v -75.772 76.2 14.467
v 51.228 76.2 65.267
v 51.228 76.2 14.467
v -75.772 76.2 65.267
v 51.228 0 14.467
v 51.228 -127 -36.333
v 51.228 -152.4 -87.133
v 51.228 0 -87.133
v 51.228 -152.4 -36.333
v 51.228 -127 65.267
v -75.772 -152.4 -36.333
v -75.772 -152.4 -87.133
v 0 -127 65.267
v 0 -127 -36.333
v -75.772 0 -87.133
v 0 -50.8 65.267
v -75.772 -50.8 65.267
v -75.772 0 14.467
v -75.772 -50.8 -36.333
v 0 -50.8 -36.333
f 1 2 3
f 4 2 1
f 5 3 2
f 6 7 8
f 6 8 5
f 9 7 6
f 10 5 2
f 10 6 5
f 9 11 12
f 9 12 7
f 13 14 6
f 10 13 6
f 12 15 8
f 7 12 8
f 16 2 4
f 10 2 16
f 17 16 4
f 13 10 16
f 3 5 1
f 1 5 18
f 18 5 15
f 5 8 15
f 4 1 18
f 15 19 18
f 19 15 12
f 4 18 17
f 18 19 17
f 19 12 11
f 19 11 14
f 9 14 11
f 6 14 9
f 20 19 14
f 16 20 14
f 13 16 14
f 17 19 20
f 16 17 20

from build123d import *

# Parameters (mm, degrees)
F0_W     = 127
F0_H     = 50.8
F1_DEPTH = 152.4
F2_W     = 76.2
F2_H     = 50.8
F3_DEPTH = 101.6
F5_DEPTH = 101.6
F6_W     = 127
F6_H     = 50.8
F7_DEPTH = 76.2


with BuildPart() as f1:
    # F0 (on Front) → F1 (new body)
    with BuildSketch(Plane.XZ):
        with Locations((-12.272136, -61.733169)):
            Rectangle(F0_W, F0_H)
    extrude(amount=F1_DEPTH)

    # F2 (on face) → F3 (join)
    with BuildSketch(Plane.XY.offset(-36.333169)):
        with Locations((-37.672136, -25.4)):
            Rectangle(F2_W, F2_H)
    extrude(amount=F3_DEPTH)

    # F4 (on face) → F5 (join)
    with BuildSketch(Plane.XY.offset(-36.333169)):
        Polygon((51.227864, -127), (51.227864, 0), (0.427864, 0), (0.427864, -50.8), (0, -50.8), (0, -127), align=None)
    extrude(amount=F5_DEPTH)

    # F6 (on face) → F7 (join)
    with BuildSketch(Plane(origin=(0, 0, 0), x_dir=(-1, 0, 0), z_dir=(0, 1, 0))):
        with Locations((12.272136, 39.866831)):
            Rectangle(F6_W, F6_H)
    extrude(amount=F7_DEPTH)


solid = f1.part
